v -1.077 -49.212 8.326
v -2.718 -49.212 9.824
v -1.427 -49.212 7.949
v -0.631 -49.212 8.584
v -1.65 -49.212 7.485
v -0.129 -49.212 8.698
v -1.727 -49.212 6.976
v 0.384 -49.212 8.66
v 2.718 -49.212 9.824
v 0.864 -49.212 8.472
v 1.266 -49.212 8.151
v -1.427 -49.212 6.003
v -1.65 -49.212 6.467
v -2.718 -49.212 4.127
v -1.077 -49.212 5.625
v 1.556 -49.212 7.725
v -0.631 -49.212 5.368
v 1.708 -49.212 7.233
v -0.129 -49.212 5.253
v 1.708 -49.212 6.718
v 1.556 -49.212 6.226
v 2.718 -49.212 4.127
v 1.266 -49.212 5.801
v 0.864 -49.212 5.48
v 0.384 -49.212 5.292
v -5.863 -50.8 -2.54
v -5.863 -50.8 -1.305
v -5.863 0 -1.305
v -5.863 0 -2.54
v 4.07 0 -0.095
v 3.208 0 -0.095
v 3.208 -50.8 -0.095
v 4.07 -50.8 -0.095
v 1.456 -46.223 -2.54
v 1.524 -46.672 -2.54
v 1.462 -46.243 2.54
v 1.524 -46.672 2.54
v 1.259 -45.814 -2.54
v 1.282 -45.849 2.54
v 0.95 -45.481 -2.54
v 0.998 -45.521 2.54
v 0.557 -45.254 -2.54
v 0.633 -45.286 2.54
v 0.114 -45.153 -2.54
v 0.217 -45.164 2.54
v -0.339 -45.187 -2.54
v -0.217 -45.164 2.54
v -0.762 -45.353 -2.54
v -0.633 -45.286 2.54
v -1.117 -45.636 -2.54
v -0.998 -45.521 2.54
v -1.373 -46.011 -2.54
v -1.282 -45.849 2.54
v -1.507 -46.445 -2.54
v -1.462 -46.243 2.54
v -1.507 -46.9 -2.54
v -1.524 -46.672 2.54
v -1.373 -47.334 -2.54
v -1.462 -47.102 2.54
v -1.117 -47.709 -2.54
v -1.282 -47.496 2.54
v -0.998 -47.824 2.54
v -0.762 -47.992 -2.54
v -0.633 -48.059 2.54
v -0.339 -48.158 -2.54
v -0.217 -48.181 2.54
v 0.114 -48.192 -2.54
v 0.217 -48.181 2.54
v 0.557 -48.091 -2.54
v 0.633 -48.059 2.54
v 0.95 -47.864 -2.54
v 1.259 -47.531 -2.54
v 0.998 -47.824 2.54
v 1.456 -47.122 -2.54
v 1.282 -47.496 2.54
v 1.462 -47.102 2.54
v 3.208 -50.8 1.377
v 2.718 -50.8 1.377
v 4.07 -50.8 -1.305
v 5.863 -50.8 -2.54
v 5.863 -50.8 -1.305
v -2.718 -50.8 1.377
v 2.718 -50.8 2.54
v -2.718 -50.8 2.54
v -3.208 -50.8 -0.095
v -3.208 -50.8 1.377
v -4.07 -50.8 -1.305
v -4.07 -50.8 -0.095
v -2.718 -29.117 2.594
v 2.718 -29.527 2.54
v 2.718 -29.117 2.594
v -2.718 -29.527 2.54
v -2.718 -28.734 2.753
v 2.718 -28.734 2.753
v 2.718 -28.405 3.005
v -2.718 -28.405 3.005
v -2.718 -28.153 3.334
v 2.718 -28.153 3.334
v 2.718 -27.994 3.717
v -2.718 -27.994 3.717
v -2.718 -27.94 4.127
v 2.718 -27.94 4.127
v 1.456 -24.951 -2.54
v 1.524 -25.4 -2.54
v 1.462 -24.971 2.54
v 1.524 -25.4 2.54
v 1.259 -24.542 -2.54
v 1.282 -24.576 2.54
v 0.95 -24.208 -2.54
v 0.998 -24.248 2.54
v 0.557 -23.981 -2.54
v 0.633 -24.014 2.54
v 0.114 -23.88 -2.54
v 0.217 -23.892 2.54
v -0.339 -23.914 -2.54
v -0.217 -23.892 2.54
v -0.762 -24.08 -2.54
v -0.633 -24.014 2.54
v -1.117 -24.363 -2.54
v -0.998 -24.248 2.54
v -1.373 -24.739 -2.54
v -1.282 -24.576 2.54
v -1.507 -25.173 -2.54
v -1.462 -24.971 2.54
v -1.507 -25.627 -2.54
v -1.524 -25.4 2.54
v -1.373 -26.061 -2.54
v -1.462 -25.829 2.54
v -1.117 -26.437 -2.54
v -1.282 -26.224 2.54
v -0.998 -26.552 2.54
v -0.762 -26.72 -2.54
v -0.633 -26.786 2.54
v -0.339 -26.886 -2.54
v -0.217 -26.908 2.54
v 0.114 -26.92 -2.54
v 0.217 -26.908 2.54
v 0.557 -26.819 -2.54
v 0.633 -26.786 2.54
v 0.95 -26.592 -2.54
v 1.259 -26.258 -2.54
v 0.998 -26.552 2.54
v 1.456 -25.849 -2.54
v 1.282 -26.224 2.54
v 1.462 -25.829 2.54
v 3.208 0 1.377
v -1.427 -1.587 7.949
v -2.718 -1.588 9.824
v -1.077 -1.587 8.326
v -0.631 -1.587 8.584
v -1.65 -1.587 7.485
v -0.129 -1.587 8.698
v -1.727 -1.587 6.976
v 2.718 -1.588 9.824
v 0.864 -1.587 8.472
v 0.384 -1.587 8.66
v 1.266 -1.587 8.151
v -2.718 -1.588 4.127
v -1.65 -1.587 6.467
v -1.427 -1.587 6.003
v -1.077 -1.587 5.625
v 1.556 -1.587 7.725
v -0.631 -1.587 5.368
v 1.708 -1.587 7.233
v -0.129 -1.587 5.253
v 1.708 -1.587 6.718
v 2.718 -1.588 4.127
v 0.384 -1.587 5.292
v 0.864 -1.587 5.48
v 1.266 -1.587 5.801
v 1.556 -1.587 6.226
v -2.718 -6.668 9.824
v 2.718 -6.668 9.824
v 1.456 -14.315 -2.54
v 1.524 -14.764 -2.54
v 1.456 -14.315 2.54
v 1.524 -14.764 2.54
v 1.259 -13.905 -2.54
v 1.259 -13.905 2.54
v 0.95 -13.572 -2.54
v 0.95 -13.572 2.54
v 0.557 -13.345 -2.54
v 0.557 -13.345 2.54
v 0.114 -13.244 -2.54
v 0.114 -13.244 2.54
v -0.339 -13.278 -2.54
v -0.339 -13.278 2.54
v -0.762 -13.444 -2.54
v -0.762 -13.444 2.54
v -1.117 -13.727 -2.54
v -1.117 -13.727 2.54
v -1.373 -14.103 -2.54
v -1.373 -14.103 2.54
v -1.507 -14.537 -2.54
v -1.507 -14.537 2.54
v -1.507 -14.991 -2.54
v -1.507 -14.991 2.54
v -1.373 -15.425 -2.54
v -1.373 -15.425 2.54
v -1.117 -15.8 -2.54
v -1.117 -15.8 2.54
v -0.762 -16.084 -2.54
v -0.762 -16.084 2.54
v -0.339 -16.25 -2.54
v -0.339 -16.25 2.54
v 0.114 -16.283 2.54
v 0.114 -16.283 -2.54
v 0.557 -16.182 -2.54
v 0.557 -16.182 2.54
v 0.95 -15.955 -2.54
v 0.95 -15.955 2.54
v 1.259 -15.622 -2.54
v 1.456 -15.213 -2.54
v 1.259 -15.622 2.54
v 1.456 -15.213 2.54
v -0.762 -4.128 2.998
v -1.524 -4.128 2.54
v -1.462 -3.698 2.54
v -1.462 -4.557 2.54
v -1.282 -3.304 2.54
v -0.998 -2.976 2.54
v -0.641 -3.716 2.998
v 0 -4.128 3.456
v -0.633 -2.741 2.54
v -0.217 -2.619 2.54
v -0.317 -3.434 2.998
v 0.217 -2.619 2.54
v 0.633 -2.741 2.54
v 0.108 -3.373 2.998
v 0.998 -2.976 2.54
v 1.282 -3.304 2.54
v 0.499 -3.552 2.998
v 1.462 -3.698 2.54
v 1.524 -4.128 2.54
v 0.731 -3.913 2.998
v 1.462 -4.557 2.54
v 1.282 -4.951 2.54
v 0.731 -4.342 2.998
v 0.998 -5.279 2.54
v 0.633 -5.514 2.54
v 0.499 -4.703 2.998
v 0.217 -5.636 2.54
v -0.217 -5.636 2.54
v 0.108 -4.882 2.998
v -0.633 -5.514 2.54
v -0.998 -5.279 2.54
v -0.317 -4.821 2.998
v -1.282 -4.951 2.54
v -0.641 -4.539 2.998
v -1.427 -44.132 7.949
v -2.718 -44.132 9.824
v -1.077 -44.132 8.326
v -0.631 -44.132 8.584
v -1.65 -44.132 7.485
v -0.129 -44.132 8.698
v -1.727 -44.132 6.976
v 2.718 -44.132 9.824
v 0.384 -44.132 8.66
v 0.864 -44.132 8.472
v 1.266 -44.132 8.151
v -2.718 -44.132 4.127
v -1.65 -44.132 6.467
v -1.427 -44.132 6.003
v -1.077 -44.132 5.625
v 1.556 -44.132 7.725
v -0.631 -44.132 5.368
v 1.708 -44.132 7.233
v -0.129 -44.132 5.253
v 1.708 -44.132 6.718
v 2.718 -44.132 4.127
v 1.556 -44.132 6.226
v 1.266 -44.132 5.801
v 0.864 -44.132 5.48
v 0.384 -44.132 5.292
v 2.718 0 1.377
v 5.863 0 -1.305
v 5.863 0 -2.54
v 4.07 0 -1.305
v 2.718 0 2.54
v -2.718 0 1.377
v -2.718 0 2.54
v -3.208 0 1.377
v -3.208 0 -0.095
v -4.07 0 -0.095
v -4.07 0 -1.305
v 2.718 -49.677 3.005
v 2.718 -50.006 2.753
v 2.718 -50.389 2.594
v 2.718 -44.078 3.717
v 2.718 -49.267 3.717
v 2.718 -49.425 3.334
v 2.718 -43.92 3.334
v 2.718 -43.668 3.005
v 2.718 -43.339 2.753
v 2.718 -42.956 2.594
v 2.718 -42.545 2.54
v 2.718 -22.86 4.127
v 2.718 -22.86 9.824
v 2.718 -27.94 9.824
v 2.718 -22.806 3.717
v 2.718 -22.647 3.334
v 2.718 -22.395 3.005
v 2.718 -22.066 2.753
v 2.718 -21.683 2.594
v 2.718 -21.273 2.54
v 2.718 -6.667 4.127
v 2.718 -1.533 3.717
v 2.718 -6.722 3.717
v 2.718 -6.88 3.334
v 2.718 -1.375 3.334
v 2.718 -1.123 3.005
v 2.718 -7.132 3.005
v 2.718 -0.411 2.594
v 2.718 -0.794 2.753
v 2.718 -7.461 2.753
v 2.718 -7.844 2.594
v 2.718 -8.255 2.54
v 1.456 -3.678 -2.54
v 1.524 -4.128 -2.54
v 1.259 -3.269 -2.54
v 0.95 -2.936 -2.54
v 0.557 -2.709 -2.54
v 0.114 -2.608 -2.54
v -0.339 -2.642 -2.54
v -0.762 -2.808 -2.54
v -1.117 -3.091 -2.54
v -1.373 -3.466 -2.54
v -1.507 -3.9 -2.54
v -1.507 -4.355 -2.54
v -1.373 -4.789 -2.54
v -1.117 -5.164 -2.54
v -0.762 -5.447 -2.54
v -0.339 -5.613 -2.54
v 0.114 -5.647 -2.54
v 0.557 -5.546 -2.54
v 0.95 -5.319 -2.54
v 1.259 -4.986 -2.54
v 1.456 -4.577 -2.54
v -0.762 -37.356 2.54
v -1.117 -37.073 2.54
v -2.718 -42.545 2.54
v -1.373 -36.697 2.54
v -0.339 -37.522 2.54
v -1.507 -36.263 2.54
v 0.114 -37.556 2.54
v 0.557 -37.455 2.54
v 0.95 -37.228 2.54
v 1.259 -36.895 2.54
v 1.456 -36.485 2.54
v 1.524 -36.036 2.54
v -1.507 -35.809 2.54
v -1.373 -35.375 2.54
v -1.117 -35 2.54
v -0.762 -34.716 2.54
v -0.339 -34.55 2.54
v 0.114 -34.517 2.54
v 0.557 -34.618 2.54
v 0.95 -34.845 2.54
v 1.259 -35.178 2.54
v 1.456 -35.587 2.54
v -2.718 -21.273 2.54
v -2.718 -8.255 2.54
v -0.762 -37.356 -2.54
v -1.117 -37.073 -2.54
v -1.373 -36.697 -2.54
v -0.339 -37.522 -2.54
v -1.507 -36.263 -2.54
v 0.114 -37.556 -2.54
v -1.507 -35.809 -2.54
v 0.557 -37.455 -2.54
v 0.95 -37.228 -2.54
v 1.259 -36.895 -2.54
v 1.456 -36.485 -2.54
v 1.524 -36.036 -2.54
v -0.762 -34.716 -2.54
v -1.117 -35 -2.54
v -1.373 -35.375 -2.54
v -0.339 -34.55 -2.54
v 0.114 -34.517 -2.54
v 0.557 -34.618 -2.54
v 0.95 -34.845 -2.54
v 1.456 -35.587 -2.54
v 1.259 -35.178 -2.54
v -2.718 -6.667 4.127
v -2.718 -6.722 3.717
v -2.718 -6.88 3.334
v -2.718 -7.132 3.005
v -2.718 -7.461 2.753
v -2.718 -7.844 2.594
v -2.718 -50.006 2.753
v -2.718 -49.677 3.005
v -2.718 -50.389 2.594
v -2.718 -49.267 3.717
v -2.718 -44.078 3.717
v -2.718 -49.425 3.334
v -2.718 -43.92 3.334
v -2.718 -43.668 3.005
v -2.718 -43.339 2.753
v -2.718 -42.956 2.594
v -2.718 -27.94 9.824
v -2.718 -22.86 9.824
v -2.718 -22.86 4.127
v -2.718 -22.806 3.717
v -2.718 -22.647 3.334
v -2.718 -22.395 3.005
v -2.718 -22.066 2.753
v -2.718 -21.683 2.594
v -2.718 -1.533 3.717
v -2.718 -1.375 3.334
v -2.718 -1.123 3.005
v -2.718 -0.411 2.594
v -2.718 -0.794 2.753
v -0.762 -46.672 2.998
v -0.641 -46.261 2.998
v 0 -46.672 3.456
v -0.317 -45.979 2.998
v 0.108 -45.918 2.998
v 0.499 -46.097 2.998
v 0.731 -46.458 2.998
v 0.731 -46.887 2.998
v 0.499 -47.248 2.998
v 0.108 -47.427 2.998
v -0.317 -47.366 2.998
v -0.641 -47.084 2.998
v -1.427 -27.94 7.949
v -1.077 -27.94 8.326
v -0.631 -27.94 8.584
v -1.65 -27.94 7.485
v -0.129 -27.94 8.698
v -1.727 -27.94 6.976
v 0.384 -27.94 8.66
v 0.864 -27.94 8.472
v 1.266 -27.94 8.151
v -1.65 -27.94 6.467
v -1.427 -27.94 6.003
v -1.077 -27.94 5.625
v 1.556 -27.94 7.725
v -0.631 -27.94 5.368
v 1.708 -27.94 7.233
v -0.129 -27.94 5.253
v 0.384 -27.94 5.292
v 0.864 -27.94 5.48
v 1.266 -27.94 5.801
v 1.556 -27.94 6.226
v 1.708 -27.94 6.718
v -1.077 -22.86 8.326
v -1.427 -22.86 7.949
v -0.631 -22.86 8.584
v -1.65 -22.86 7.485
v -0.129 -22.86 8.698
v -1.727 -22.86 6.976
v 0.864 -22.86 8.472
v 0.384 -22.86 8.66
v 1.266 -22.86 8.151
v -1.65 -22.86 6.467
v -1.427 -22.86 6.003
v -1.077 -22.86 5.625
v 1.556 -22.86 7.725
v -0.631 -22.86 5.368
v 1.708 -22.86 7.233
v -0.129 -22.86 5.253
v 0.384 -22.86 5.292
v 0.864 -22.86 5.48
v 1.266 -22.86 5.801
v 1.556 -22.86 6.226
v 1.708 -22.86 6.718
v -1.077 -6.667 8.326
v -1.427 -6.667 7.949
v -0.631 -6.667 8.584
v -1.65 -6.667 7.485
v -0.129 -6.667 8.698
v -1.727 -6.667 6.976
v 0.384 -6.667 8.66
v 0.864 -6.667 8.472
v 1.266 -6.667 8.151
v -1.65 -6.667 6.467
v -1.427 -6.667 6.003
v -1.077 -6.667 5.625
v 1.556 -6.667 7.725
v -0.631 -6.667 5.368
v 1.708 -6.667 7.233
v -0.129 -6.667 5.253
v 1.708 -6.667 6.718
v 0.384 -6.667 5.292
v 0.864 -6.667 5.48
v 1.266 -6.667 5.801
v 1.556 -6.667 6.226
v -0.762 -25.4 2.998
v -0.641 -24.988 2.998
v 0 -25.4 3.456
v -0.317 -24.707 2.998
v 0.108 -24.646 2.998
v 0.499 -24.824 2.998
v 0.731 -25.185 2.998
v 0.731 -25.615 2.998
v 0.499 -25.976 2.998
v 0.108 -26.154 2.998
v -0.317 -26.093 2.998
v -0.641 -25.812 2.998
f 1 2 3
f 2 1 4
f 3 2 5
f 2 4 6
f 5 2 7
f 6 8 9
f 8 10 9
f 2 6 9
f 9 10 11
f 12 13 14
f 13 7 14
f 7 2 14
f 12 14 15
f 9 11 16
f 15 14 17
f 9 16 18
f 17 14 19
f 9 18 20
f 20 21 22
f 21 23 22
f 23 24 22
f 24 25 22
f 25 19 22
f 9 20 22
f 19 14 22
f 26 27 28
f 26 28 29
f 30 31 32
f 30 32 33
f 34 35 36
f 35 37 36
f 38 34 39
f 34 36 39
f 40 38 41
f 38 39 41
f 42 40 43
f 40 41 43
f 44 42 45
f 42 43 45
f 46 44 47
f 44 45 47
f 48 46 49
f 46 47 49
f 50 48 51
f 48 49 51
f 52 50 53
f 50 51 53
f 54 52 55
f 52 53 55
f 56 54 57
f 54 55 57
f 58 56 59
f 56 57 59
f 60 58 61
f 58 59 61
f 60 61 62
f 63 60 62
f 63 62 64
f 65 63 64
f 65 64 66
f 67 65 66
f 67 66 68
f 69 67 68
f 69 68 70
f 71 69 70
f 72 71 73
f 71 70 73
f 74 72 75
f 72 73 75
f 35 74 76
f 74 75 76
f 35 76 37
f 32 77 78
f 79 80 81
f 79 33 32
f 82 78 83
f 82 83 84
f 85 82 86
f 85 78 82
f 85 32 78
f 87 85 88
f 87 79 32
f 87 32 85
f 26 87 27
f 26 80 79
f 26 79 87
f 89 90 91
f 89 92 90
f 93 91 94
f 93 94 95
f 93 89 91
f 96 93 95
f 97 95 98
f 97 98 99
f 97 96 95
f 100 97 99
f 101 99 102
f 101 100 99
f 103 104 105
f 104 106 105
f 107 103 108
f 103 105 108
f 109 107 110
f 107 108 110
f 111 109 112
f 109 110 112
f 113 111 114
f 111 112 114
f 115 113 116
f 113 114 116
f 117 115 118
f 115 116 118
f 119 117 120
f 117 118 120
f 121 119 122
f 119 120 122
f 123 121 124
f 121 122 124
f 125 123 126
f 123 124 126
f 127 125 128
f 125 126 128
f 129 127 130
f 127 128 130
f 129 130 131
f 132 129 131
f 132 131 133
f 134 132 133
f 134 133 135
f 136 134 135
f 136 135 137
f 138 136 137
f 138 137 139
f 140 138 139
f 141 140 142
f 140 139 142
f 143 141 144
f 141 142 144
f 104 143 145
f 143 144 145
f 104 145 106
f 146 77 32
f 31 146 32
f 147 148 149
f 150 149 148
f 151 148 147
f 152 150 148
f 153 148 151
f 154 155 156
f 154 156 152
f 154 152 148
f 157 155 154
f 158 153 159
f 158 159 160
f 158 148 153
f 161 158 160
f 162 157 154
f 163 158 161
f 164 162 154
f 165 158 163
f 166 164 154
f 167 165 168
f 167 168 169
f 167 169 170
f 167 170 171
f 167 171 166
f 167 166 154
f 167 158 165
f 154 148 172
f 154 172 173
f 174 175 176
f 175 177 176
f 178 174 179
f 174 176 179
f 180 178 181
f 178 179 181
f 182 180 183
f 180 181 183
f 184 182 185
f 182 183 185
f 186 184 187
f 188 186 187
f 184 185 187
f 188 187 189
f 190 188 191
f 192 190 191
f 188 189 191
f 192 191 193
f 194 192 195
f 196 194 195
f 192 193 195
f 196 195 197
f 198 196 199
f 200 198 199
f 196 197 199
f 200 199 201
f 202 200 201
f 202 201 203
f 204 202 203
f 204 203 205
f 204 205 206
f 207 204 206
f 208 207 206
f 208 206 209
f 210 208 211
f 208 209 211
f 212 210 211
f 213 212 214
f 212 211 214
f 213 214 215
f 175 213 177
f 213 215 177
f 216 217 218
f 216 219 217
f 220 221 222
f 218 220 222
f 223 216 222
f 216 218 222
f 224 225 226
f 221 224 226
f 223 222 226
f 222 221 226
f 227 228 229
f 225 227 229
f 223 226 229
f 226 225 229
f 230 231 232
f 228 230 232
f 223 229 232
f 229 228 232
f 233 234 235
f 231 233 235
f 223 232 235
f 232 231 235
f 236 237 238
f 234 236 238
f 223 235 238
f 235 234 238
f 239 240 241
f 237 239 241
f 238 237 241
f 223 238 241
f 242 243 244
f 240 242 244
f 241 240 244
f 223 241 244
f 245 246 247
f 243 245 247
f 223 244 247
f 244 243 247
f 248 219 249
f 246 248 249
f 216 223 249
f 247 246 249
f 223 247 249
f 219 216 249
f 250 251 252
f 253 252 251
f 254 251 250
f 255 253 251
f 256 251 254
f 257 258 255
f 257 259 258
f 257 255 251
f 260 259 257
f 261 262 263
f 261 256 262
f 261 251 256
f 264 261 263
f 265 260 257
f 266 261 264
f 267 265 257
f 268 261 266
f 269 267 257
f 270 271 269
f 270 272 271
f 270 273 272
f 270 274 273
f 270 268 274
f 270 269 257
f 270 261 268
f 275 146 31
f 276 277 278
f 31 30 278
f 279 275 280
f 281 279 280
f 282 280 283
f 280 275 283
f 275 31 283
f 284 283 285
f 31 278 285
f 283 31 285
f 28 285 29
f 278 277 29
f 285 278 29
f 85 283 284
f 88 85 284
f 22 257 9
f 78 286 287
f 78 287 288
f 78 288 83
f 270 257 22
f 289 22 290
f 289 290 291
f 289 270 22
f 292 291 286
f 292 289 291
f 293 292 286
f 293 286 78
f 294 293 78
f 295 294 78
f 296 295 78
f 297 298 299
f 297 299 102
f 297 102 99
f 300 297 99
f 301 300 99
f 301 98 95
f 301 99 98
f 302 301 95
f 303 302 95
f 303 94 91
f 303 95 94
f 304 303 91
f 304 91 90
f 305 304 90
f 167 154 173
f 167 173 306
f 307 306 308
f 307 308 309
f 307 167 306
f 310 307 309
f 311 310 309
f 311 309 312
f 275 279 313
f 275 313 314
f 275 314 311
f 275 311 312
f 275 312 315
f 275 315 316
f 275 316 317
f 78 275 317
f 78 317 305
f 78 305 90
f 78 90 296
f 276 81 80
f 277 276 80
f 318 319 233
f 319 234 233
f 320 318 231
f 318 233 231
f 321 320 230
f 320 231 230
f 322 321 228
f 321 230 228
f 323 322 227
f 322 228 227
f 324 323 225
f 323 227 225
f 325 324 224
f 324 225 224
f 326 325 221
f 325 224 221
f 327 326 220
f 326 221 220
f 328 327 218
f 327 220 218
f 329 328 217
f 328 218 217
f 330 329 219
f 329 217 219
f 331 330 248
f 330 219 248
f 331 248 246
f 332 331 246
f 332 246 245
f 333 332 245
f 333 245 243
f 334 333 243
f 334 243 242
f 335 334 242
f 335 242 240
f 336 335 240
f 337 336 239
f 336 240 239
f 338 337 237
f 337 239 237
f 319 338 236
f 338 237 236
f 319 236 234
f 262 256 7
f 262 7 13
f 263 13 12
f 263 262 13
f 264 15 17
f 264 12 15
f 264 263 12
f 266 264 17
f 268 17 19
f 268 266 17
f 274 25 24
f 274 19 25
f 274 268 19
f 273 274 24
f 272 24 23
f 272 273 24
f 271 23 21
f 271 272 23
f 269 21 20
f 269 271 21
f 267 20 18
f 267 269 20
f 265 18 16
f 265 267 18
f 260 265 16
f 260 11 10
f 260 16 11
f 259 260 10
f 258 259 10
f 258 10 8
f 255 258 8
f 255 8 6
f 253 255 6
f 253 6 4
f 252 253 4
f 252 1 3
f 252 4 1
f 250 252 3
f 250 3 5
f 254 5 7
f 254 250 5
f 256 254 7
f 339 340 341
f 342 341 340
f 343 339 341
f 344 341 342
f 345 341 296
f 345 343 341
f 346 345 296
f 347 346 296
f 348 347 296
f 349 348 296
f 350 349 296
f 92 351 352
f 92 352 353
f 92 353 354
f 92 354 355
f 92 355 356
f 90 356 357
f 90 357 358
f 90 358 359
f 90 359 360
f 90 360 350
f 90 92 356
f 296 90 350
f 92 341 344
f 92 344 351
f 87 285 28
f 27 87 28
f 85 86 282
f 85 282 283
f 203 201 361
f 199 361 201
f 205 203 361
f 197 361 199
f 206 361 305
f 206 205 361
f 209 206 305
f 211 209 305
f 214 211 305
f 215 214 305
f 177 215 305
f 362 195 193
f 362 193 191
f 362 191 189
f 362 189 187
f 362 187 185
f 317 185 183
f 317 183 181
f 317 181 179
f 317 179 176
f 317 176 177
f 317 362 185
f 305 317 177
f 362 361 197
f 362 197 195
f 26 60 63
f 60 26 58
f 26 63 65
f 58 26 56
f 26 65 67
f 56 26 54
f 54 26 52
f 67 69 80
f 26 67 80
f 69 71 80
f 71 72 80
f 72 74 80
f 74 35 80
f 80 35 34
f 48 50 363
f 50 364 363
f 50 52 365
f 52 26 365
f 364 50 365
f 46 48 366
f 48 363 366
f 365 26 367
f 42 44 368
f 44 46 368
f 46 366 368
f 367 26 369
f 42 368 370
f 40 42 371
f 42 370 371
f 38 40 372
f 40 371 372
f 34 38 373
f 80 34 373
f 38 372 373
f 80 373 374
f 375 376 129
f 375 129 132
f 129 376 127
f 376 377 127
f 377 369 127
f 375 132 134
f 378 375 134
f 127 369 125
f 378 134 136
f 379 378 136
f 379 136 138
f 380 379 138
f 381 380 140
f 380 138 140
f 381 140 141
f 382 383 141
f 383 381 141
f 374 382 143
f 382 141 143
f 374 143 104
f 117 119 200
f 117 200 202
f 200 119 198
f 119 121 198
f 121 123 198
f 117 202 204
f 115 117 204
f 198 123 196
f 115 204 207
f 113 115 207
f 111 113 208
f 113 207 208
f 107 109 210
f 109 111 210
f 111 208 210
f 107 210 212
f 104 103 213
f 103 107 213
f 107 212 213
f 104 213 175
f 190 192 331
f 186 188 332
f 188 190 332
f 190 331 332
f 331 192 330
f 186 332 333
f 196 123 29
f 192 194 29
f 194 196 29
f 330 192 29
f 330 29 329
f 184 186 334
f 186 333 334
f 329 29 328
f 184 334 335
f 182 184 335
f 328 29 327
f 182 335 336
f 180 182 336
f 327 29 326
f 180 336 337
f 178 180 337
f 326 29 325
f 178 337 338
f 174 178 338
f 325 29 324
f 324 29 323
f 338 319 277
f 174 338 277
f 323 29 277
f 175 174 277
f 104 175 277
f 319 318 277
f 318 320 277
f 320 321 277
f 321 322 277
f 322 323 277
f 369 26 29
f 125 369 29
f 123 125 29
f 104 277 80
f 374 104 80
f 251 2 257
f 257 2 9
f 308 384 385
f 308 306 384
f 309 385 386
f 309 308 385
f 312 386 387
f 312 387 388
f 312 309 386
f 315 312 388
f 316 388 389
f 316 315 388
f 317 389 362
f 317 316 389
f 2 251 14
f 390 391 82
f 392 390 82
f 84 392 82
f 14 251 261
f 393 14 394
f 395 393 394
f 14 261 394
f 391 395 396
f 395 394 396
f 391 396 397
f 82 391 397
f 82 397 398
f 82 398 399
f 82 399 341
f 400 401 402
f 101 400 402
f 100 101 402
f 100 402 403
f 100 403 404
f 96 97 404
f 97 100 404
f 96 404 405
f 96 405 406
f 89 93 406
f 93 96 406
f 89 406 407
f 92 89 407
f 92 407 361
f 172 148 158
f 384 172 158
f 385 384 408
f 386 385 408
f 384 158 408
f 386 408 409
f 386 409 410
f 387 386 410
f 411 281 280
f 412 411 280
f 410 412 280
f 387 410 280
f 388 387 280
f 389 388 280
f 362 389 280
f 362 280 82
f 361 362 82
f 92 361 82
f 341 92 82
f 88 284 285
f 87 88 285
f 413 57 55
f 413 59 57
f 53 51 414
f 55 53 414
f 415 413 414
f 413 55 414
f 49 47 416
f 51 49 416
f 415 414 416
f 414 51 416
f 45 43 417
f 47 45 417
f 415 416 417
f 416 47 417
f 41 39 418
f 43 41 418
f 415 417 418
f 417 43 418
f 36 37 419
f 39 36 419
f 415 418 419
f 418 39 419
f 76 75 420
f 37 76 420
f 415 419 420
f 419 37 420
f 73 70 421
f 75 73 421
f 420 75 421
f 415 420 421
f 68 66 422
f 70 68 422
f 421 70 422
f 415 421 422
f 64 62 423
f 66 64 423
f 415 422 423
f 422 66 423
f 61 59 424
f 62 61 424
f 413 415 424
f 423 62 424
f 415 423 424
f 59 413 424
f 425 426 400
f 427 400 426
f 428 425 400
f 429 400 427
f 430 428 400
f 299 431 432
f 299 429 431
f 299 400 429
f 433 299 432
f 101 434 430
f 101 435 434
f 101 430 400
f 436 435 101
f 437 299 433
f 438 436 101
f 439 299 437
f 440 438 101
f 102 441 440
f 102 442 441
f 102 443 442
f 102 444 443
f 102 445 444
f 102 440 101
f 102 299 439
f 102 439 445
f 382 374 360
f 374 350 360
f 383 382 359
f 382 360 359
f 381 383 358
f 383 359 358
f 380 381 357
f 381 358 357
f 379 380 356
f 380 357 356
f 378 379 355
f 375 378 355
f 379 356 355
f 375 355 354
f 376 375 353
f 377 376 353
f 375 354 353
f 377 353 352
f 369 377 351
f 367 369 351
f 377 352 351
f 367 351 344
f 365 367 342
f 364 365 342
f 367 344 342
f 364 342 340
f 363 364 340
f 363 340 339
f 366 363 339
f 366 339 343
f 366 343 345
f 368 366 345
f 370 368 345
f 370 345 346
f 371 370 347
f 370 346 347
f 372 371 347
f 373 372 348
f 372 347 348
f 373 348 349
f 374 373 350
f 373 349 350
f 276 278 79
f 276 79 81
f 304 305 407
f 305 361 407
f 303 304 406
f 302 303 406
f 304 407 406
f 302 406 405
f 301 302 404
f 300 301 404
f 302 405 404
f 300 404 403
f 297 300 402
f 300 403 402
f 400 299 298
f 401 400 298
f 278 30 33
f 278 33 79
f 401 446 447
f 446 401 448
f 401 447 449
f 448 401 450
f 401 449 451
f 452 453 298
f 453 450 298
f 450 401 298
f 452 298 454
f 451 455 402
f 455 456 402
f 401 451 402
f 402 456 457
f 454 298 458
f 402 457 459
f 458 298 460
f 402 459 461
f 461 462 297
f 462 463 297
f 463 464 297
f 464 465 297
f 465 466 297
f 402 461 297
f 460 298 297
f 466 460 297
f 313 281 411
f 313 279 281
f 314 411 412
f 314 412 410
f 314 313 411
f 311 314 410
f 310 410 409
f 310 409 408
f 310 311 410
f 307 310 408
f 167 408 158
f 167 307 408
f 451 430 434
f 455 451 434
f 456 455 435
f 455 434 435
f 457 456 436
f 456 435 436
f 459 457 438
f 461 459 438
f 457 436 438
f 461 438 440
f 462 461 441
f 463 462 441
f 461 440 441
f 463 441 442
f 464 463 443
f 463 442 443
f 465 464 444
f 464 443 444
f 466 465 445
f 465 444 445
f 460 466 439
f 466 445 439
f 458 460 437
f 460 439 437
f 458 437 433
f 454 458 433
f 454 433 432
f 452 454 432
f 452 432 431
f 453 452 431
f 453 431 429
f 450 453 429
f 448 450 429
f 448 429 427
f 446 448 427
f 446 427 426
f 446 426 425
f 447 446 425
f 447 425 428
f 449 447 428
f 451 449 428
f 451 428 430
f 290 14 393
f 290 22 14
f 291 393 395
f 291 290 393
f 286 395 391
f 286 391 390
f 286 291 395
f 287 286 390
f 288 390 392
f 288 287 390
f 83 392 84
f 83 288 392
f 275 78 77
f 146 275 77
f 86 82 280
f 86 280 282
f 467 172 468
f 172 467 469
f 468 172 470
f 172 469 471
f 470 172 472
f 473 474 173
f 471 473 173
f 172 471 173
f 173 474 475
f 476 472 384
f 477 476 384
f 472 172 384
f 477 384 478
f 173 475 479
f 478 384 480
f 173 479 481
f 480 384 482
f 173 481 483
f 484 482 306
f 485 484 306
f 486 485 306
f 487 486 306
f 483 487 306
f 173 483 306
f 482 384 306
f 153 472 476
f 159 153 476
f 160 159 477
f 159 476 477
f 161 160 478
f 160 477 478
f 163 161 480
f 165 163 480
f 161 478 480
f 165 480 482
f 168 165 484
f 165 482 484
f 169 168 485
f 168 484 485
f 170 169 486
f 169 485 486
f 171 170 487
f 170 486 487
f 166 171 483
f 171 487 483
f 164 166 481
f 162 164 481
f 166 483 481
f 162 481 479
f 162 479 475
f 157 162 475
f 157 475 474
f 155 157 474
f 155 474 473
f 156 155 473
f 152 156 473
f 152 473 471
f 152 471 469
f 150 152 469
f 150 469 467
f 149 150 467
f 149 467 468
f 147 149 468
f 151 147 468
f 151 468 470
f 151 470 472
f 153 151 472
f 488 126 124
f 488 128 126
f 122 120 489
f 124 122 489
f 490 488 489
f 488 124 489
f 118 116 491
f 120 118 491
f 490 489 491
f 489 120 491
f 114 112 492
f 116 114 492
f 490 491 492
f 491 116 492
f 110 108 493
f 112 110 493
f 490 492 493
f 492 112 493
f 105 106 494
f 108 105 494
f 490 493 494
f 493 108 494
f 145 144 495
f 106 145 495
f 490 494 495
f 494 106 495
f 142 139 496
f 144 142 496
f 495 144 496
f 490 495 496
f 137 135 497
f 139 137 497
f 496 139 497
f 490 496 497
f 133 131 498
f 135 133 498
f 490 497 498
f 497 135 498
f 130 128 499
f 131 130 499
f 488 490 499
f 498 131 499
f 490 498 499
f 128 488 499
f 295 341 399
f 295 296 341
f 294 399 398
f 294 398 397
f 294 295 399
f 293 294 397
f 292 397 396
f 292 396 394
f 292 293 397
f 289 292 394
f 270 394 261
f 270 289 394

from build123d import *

# Parameters (mm, degrees)
SKETCH1_W                            = 5.4356
SKETCH1_H                            = 5.08
BOSS_EXTRUDE1_DEPTH                  = 50.8
SKETCH4_W                            = 5.4356
SKETCH4_H                            = 7.283958
BOSS_EXTRUDE3_DEPTH                  = 5.08
SKETCH13_W                           = 7.283958
SKETCH13_H                           = 5.08
BOSS_EXTRUDE6_DEPTH                  = 5.4356
FILLET1_R                            = 1.5875
F_4_CLEARANCE_HOLE1_D                = 3.4544
FILLET1_OF_MIRROR5_R                 = 1.5875
BOSS_EXTRUDE4_DEPTH                  = 50.8
TAPPED_HOLE_FOR_4_40_HELICOIL1_D     = 3.048
TAPPED_HOLE_FOR_4_40_HELICOIL1_DEPTH = 5.08
TAPPED_HOLE_FOR_4_40_HELICOIL1_TIP   = 0.915711583


with BuildPart() as part:
    # Sketch1 → Boss-Extrude1 (new body)
    with BuildSketch(Plane(origin=(0, 0, 0), x_dir=(1, 0, 0), z_dir=(0, 1, 0))):
        Rectangle(SKETCH1_W, SKETCH1_H)
    extrude(amount=-BOSS_EXTRUDE1_DEPTH)

    # Sketch4 → Boss-Extrude3 (add)
    with BuildSketch(Plane(origin=(0, -1.5875, 0), x_dir=(1, 0, 0), z_dir=(0, 1, 0))):
        with Locations((0, -6.181979)):
            Rectangle(SKETCH4_W, SKETCH4_H)
    boss_extrude3 = extrude(amount=-BOSS_EXTRUDE3_DEPTH)

    # Sketch13 → Boss-Extrude6 (add)
    with BuildSketch(Plane(origin=(2.7178, 0, 0), x_dir=(0, 0, -1), z_dir=(1, 0, 0))):
        with Locations((-6.181979, -25.4)):
            Rectangle(SKETCH13_W, SKETCH13_H)
    extrude(amount=-BOSS_EXTRUDE6_DEPTH)

    # Fillet1
    fillet1_edges = [part.edges().sort_by_distance(p)[0] for p in [
        (0, -6.6675, 2.54),
        (0, -1.5875, 2.54),
        (0, -27.94, 2.54),
        (0, -22.86, 2.54),
    ]]
    fillet(fillet1_edges, radius=FILLET1_R - 0.0001)  # a hair under: the kernel refuses the full size

    # #4 Clearance Hole1 (through all)
    with Locations(Plane(origin=(0, 0, 0), x_dir=(1, 0, 0), z_dir=(0, 1, 0))):
        with Locations((0, -6.975729)):
            f_4_clearance_hole1 = Hole(F_4_CLEARANCE_HOLE1_D / 2)

    # Mirror5: Boss-Extrude3, #4 Clearance Hole1 across plane
    add(boss_extrude3.mirror(Plane.ZX.offset(-25.4)))
    add(f_4_clearance_hole1.mirror(Plane.ZX.offset(-25.4)), mode=Mode.SUBTRACT)

    # Fillet1 of Mirror5
    fillet1_of_mirror5_edges = [part.edges().sort_by_distance(p)[0] for p in [
        (0, -44.1325, 2.54),
        (0, -49.2125, 2.54),
        (0, -21.2726, 2.54),
        (0, -27.94, 4.1274),
    ]]
    fillet(fillet1_of_mirror5_edges, radius=FILLET1_OF_MIRROR5_R - 0.0001)  # a hair under: the kernel refuses the full size

    # Sketch7 → Boss-Extrude4 (add)
    with BuildSketch(Plane(origin=(0, 0, 0), x_dir=(1, 0, 0), z_dir=(0, 1, 0))):
        Polygon((3.207601712, -1.376528509), (3.207601712, 0.095381072), (4.069572105, 0.095381072), (4.069572105, 1.304918523), (5.863211288, 1.304918523), (5.863211288, 2.54), (2.7178, 2.54), (2.7178, -1.376528509), align=None)
    boss_extrude4 = extrude(amount=-BOSS_EXTRUDE4_DEPTH)

    # Mirror6: Boss-Extrude4 across plane
    add(boss_extrude4.mirror(Plane(origin=(0, 0, 0), x_dir=(0, 0, 1), z_dir=(1, 0, 0))))

    # Tapped Hole for #4-40 Helicoil1
    with Locations(Plane(origin=(0, 0, -2.54), x_dir=(-1, 0, 0), z_dir=(0, 0, -1))):
        with Locations((0, -4.1275), (0, -46.6725), (0, -25.4), (0, -14.76375), (0, -36.03625)):
            Hole(TAPPED_HOLE_FOR_4_40_HELICOIL1_D / 2, depth=TAPPED_HOLE_FOR_4_40_HELICOIL1_DEPTH)
            with Locations((0, 0, -(TAPPED_HOLE_FOR_4_40_HELICOIL1_DEPTH + TAPPED_HOLE_FOR_4_40_HELICOIL1_TIP / 2))):  # 118° drill point
                Cone(0, TAPPED_HOLE_FOR_4_40_HELICOIL1_D / 2, TAPPED_HOLE_FOR_4_40_HELICOIL1_TIP, mode=Mode.SUBTRACT)


solid = part.part
